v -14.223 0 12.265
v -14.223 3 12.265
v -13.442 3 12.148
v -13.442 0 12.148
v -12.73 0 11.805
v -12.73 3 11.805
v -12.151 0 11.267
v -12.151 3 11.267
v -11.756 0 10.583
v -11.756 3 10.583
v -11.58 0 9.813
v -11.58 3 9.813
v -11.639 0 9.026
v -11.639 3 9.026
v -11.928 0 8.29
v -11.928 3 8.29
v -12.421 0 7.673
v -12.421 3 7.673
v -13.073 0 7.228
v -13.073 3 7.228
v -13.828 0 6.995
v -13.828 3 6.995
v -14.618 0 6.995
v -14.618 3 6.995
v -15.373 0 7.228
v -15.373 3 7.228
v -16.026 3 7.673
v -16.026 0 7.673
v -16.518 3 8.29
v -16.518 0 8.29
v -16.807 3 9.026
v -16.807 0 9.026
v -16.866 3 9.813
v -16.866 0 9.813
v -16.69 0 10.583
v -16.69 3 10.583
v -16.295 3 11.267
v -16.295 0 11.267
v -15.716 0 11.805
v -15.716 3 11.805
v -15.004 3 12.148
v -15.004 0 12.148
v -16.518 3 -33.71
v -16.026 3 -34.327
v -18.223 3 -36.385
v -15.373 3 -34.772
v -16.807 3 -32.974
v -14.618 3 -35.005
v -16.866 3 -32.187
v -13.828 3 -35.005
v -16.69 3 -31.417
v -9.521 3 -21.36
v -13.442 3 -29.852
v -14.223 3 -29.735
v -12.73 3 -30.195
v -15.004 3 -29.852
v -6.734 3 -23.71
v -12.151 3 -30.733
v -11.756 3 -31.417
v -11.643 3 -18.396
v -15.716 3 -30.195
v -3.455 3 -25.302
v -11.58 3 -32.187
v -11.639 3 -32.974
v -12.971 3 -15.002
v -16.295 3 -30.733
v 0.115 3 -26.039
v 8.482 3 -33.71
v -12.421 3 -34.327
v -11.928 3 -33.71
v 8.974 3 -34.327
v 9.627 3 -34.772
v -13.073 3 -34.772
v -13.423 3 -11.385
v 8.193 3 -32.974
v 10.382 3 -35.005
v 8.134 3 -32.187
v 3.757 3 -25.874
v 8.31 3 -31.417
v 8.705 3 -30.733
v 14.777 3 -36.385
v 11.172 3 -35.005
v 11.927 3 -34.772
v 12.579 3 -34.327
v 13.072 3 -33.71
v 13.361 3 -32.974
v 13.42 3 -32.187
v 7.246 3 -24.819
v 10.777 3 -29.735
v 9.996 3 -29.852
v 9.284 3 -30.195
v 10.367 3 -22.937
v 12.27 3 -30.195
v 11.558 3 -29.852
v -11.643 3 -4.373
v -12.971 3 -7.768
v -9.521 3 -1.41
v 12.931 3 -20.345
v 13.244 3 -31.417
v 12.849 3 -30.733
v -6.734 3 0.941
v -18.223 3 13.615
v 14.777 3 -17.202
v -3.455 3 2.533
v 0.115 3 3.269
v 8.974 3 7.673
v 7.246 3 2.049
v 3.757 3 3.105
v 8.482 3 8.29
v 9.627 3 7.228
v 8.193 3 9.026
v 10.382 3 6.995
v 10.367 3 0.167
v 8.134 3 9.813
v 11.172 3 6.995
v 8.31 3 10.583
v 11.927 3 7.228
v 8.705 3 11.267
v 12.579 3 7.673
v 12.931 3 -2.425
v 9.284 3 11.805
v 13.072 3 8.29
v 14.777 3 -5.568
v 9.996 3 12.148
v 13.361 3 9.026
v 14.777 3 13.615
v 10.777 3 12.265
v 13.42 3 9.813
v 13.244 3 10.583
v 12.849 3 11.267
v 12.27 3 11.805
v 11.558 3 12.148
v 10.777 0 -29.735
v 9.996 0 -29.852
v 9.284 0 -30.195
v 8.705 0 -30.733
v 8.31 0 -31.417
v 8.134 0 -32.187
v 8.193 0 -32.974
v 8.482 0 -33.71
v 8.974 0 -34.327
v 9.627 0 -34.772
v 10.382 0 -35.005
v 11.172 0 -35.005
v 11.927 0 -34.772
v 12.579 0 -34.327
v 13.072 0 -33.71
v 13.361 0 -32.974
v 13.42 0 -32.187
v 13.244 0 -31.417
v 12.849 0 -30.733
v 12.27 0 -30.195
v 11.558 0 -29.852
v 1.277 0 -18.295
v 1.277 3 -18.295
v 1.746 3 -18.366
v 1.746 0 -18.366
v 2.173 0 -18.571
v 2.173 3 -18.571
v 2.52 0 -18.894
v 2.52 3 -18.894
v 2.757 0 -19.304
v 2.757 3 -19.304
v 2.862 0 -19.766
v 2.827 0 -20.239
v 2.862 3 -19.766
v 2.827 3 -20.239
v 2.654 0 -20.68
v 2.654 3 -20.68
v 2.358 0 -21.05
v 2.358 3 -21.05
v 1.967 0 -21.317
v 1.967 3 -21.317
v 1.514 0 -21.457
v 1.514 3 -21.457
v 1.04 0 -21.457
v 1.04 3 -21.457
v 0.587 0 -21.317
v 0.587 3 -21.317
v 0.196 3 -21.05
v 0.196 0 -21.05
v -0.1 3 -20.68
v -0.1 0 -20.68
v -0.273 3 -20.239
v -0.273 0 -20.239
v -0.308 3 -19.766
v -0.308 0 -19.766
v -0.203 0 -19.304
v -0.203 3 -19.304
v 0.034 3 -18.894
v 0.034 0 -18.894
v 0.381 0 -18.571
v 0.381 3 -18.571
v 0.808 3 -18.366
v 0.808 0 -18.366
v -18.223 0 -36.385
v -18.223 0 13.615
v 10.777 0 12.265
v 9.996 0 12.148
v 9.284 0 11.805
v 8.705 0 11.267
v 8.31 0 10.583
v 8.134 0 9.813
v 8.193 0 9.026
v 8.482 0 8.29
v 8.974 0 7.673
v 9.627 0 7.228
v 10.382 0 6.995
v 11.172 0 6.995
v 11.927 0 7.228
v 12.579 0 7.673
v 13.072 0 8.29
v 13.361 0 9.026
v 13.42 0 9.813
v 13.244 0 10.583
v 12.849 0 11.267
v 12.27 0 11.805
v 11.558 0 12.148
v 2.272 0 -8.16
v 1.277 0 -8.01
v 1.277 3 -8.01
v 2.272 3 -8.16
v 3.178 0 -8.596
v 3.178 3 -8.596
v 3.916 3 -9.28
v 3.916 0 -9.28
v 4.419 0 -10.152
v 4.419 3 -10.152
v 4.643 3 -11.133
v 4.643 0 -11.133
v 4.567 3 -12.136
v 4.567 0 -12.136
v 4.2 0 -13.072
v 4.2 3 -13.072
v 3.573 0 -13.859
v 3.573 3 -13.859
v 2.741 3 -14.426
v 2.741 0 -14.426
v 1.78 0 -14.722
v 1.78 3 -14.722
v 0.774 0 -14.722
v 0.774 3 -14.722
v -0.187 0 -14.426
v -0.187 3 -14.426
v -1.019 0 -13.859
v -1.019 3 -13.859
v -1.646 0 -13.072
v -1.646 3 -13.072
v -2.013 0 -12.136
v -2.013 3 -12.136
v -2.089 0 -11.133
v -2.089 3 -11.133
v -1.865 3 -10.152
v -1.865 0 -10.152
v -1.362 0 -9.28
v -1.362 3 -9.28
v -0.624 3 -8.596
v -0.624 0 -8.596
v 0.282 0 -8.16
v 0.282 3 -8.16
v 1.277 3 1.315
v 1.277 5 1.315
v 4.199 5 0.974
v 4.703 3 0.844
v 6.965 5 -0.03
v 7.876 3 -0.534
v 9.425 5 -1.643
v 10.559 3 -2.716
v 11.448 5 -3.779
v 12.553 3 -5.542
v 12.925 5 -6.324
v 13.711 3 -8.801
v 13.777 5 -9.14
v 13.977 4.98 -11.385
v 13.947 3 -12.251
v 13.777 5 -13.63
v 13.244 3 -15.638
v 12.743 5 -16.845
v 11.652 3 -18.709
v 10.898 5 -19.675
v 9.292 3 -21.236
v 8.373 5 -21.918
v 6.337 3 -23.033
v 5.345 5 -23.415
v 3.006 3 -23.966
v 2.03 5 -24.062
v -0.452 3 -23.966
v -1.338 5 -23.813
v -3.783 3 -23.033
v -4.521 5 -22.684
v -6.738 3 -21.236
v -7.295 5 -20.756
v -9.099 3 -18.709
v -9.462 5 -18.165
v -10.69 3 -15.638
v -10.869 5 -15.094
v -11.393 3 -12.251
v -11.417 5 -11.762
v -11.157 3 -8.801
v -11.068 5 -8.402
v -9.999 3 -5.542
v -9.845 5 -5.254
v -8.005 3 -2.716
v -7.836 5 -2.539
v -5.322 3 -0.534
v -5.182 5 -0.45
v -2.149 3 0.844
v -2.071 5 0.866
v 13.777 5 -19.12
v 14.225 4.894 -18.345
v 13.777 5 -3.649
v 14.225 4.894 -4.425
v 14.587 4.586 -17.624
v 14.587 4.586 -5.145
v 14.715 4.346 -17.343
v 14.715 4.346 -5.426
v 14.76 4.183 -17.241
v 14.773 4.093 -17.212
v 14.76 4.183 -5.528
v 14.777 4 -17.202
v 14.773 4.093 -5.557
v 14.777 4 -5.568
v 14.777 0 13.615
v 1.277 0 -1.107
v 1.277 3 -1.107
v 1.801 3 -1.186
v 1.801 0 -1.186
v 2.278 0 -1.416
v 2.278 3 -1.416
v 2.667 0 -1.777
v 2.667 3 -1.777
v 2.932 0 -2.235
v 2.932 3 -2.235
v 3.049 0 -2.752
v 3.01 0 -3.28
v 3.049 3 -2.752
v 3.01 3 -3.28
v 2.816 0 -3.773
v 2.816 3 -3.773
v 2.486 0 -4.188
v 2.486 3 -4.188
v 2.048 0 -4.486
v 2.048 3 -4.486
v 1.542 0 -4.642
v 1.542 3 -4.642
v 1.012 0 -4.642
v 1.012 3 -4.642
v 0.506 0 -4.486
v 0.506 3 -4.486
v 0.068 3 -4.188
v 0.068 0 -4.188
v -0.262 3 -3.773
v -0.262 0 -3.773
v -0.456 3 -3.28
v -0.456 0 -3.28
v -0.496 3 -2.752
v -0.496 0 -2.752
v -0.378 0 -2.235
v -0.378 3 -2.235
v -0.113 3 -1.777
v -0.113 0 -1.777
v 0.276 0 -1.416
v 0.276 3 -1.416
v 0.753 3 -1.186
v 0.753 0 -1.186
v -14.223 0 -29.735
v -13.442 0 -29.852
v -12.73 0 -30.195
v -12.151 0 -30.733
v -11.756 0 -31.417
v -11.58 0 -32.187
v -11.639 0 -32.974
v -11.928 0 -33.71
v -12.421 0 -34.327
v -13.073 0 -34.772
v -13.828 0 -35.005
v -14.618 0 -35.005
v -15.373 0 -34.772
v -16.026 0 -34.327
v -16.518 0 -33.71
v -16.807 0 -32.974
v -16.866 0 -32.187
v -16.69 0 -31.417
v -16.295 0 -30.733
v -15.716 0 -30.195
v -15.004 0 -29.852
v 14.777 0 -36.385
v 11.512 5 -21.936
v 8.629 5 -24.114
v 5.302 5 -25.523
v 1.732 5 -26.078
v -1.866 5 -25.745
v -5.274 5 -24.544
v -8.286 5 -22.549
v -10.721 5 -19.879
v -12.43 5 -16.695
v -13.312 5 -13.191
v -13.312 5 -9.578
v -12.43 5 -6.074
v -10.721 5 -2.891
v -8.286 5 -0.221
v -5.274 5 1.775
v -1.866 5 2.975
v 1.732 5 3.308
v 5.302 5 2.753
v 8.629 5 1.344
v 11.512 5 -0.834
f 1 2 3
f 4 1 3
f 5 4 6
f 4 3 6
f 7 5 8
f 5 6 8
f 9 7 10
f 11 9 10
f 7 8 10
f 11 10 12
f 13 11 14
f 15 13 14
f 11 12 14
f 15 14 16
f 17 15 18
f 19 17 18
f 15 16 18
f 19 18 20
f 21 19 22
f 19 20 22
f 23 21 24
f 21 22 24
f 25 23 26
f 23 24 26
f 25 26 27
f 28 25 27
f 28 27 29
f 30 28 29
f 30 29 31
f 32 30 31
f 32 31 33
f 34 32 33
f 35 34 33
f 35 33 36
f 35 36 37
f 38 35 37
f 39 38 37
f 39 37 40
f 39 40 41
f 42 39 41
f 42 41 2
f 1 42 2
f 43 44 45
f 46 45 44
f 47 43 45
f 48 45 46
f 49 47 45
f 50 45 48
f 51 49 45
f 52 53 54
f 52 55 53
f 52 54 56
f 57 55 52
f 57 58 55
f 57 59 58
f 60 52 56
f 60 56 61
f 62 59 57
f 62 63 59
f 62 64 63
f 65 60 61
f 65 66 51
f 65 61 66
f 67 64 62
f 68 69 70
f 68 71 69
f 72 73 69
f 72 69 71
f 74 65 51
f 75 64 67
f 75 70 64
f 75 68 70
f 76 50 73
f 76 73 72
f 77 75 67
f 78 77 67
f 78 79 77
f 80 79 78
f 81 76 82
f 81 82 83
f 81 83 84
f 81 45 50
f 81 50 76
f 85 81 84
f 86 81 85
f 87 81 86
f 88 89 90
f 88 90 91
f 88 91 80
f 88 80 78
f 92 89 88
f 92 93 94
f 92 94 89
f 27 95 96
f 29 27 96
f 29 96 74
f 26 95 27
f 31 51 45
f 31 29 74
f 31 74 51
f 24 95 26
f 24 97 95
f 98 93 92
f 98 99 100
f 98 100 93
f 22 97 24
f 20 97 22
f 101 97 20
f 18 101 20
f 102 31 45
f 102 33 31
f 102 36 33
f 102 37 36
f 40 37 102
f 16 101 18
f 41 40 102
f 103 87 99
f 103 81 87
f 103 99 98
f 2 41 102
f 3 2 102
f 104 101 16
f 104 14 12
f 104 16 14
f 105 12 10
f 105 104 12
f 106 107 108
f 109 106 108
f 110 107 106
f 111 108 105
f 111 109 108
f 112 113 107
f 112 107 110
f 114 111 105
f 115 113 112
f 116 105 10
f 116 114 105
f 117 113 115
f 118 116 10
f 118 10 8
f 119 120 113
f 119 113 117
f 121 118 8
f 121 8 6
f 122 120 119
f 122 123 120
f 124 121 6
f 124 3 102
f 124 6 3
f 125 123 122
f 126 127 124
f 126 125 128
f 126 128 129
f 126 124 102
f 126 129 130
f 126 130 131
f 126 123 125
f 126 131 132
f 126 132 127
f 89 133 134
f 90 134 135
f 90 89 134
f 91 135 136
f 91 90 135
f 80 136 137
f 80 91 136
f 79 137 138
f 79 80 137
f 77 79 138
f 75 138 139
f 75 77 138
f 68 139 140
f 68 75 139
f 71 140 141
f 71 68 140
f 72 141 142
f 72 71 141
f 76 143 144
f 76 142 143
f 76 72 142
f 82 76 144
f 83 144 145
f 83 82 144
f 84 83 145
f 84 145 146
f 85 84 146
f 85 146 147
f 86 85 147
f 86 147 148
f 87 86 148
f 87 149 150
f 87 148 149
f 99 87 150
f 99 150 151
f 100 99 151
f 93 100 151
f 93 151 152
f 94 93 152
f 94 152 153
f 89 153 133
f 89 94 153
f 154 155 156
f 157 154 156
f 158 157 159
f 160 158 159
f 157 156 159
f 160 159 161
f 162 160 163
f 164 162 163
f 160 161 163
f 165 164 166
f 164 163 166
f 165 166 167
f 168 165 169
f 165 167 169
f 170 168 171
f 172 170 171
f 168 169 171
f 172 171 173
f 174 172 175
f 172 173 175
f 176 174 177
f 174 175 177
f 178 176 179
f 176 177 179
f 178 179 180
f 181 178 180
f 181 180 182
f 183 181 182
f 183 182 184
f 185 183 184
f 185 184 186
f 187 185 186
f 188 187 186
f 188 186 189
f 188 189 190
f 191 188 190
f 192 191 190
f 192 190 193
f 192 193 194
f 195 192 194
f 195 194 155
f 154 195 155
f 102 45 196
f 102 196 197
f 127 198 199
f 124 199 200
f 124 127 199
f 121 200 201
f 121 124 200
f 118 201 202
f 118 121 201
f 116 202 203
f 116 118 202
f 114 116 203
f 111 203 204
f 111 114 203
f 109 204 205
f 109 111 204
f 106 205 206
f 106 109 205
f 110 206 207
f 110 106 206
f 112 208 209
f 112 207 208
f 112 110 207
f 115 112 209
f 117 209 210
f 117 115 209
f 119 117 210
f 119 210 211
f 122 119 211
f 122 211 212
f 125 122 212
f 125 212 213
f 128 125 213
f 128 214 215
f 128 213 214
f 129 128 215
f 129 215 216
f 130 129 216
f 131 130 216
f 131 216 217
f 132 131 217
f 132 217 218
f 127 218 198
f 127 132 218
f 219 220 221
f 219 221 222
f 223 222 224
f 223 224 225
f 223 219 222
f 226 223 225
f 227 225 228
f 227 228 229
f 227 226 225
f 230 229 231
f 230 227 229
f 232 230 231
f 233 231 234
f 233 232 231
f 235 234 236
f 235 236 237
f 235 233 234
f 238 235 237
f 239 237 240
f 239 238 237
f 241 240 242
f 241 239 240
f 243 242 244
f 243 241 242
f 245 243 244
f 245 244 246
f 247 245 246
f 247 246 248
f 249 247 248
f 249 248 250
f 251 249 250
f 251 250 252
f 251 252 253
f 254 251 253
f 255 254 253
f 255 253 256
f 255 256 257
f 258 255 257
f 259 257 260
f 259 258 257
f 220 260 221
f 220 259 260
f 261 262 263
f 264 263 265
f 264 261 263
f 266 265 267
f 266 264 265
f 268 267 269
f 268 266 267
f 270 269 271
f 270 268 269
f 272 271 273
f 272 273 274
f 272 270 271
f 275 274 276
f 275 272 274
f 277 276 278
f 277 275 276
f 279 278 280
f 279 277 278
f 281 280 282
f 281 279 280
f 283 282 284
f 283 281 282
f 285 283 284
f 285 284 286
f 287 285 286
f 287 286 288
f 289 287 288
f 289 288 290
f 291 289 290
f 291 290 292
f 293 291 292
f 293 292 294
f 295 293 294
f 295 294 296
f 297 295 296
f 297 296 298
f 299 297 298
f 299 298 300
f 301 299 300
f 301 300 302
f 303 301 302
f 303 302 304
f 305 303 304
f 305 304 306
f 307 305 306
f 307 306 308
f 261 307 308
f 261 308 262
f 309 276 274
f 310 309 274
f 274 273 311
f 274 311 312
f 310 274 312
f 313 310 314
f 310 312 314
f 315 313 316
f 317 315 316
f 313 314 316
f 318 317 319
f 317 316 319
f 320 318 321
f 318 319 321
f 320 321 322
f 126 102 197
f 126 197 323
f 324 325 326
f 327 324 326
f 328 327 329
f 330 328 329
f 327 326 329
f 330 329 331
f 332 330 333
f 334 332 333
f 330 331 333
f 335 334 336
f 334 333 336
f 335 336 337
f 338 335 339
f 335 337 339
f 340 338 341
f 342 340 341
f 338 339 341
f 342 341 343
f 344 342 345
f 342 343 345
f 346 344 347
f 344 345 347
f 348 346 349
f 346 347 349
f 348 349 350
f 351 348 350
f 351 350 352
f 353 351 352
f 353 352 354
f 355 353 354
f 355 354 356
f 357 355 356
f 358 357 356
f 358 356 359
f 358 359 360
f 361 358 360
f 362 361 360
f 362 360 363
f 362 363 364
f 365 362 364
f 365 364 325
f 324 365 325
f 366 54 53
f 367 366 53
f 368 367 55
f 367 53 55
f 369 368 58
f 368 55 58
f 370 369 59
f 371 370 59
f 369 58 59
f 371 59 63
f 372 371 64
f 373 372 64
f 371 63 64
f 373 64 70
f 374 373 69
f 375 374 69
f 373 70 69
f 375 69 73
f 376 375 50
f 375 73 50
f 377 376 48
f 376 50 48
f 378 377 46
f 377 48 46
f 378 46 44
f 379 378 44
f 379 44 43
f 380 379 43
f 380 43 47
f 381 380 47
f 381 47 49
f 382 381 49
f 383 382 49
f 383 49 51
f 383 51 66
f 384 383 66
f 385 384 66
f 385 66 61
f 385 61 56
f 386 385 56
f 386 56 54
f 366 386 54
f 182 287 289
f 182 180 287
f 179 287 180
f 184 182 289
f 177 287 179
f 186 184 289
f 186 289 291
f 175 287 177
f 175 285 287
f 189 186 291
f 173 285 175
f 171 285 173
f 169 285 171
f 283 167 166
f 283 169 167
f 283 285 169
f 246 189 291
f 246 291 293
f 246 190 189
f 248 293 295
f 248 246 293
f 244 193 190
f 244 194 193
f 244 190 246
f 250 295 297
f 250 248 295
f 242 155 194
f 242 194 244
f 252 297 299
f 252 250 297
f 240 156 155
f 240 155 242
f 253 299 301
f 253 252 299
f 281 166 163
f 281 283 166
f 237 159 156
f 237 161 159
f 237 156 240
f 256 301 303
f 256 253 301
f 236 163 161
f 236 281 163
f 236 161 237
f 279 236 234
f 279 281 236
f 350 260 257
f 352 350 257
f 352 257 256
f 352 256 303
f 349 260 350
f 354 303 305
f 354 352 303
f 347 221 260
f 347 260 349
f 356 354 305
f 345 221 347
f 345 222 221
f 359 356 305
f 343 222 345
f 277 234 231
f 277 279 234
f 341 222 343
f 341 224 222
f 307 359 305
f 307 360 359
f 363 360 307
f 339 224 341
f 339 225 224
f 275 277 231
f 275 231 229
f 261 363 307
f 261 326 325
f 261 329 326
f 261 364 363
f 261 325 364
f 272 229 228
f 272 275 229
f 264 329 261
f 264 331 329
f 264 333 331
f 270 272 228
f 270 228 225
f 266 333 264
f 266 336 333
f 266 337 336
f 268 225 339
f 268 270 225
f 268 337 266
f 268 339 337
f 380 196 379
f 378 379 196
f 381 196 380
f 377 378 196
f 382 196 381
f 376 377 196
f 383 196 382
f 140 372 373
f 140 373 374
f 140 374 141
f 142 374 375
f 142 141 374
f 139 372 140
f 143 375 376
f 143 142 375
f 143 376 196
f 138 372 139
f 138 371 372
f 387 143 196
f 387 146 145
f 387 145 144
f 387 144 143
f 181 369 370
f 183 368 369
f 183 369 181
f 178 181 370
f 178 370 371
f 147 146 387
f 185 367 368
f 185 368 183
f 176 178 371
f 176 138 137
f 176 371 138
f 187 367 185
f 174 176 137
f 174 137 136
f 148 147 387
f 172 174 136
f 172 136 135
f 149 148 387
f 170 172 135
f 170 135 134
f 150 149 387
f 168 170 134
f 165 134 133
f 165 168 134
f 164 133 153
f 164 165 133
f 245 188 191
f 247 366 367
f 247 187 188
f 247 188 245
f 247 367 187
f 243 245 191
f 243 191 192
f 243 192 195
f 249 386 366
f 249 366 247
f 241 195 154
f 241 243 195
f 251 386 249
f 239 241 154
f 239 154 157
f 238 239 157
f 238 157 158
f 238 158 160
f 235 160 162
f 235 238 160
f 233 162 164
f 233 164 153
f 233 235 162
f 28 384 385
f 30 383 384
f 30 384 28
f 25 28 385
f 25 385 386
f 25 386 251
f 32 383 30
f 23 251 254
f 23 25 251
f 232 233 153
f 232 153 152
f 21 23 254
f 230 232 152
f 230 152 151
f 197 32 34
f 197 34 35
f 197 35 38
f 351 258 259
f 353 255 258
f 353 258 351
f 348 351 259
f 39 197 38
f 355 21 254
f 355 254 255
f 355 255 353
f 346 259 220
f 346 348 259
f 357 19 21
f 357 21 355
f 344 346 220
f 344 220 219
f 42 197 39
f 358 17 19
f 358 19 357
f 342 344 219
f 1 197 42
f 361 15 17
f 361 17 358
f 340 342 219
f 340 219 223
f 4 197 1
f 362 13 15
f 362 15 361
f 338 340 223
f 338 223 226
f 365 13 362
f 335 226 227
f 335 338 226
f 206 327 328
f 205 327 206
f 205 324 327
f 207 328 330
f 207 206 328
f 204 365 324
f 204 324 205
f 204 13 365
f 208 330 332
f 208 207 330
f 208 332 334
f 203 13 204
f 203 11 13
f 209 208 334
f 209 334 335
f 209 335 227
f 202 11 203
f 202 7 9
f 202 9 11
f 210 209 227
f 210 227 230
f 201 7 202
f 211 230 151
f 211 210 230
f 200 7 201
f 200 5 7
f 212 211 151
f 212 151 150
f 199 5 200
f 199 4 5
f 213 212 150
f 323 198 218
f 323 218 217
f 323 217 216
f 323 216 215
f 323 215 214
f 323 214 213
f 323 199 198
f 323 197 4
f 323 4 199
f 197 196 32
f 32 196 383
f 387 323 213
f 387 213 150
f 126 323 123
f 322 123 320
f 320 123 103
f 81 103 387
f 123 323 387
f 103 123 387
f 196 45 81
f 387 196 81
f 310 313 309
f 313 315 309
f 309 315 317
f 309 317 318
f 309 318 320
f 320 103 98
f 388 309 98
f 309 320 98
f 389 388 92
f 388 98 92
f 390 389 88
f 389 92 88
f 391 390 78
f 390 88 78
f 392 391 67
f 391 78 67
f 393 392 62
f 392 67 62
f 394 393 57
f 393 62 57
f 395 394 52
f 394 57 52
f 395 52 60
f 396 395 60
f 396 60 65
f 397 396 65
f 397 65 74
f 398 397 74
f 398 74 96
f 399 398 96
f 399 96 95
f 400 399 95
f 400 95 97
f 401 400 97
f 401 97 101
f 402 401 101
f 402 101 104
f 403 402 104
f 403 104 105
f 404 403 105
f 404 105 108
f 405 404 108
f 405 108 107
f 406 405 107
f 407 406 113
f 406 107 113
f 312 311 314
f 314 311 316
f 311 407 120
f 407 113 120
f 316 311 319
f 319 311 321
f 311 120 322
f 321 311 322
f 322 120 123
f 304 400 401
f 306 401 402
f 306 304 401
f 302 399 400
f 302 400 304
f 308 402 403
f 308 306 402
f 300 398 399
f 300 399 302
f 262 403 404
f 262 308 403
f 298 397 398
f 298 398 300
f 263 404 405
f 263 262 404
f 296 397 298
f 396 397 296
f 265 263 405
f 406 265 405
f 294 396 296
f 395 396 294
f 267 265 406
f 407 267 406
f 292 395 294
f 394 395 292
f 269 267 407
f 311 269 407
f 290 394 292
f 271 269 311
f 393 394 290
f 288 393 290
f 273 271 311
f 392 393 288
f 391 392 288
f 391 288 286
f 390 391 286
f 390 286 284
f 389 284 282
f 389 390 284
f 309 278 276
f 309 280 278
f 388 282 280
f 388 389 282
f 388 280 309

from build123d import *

# Parameters (mm, degrees)
SKETCH1_W           = 25
SKETCH1_H           = 50
SKETCH1_R           = 3.375
BOSS_EXTRUDE1_DEPTH = 3
SKETCH2_W           = 50
SKETCH2_H           = 3
BOSS_EXTRUDE2_DEPTH = 8
SKETCH3_W           = 8
SKETCH3_H           = 50
BOSS_EXTRUDE3_DEPTH = 42
SKETCH4_R           = 2.65
CUT_EXTRUDE1_DEPTH  = 3.3
SKETCH5_R           = 5.802370205
CUT_EXTRUDE2_DEPTH  = 9
FILLET2_R           = 1
SKETCH6_R           = 12.7
BOSS_EXTRUDE4_DEPTH = 2
FILLET4_R           = 1
SKETCH8_R           = 1.589780168
SKETCH8_R_2         = 1.777428262
CUT_EXTRUDE3_DEPTH  = 10
SKETCH9_W           = 8
SKETCH9_H           = 42
CUT_EXTRUDE4_DEPTH  = 68.79439129


with BuildPart() as part:
    # Sketch1 → Boss-Extrude1 (new body)
    with BuildSketch(Plane(origin=(0, 0, 0), x_dir=(1, 0, 0), z_dir=(0, 1, 0))):
        with Locations((2.276951673, 11.384758364)):
            Rectangle(SKETCH1_W, SKETCH1_H)
        with Locations(Location((1.276951673, 11.384758364, 0), (0, 0, 270))):
            Circle(SKETCH1_R, mode=Mode.SUBTRACT)
    extrude(amount=BOSS_EXTRUDE1_DEPTH)

    # Sketch2 → Boss-Extrude2 (add)
    with BuildSketch(Plane.ZY.offset(10.223048327)):
        with Locations((-11.384758364, 1.5)):
            Rectangle(SKETCH2_W, SKETCH2_H)
    extrude(amount=BOSS_EXTRUDE2_DEPTH)

    # Sketch3 → Boss-Extrude3 (add)
    with BuildSketch(Plane.XZ):
        with Locations((-14.223048327, -11.384758364)):
            Rectangle(SKETCH3_W, SKETCH3_H)
    extrude(amount=BOSS_EXTRUDE3_DEPTH)

    # Sketch4 → Cut-Extrude1 (cut)
    with BuildSketch(Plane(origin=(0, 3, 0), x_dir=(1, 0, 0), z_dir=(0, 1, 0))):
        with Locations(Location((-14.223048327, 32.384758364, 0), (0, 0, 270))):
            Circle(SKETCH4_R)
        with Locations(Location((-14.223048327, -9.615241636, 0), (0, 0, 270))):
            Circle(SKETCH4_R)
    cut_extrude1 = extrude(amount=-CUT_EXTRUDE1_DEPTH, mode=Mode.SUBTRACT)

    # Mirror1: Cut-Extrude1 across plane
    add(cut_extrude1.mirror(Plane.ZX.offset(-19.5)), mode=Mode.SUBTRACT)

    # Sketch5 → Cut-Extrude2 (cut)
    with BuildSketch(Plane.ZY.offset(18.223048327)):
        with Locations((-11.836279124, -21)):
            Circle(SKETCH5_R)
    extrude(amount=-CUT_EXTRUDE2_DEPTH, mode=Mode.SUBTRACT)

    # Fillet2
    fillet2_edges = [part.edges().sort_by_distance(p)[0] for p in [
        (-10.223048327, -21, -17.638649329),
    ]]
    fillet(fillet2_edges, radius=FILLET2_R)

    # Mirror2: Cut-Extrude1 across plane
    add(cut_extrude1.mirror(Plane.ZY.offset(1.723048327)), mode=Mode.SUBTRACT)

    # Sketch6 → Boss-Extrude4 (add)
    with BuildSketch(Plane(origin=(0, 3, 0), x_dir=(1, 0, 0), z_dir=(0, 1, 0))):
        with BuildLine():
            Line((14.776951673, 5.567542535), (14.776951673, 17.201974193))
            ThreePointArc((14.776951673, 17.201974193), (-13.423048327, 11.384758364), (14.776951673, 5.567542535))
        make_face()
        with Locations(Location((1.276951673, 11.384758364, 0), (0, 0, 270))):
            Circle(SKETCH6_R, mode=Mode.SUBTRACT)
    extrude(amount=BOSS_EXTRUDE4_DEPTH)

    # Fillet4
    # the kernel refuses this fillet: 1 mm, written as the material it takes off along each edge
    with BuildSketch(Plane(origin=(14.776951673, 5, -3.067542535), x_dir=(0, -1, 0), z_dir=(0, 0, -1))) as fillet4_piece_1:
        with BuildLine():
            CenterArc((FILLET4_R, FILLET4_R), FILLET4_R, 180, 90)
            Line((0, FILLET4_R), (0, 0))
            Line((0, 0), (FILLET4_R, 0))
        make_face()
    extrude(amount=16.634431658, mode=Mode.SUBTRACT)

    # Sketch8 → Cut-Extrude3 (cut)
    with BuildSketch(Plane(origin=(0, 3, 0), x_dir=(1, 0, 0), z_dir=(0, 1, 0))):
        with Locations(Location((1.276951673, 19.884758364, 0), (0, 0, 270))):
            Circle(SKETCH8_R)
        with Locations(Location((1.276951673, 2.884758364, 0), (0, 0, 270))):
            Circle(SKETCH8_R_2)
    extrude(amount=-CUT_EXTRUDE3_DEPTH, mode=Mode.SUBTRACT)

    # Sketch9 → Cut-Extrude4 (cut, through all)
    with BuildSketch(Plane.XY.offset(13.615241636)):
        with Locations((-14.223048327, -21)):
            Rectangle(SKETCH9_W, SKETCH9_H)
    extrude(amount=-CUT_EXTRUDE4_DEPTH, mode=Mode.SUBTRACT)


solid = part.part
